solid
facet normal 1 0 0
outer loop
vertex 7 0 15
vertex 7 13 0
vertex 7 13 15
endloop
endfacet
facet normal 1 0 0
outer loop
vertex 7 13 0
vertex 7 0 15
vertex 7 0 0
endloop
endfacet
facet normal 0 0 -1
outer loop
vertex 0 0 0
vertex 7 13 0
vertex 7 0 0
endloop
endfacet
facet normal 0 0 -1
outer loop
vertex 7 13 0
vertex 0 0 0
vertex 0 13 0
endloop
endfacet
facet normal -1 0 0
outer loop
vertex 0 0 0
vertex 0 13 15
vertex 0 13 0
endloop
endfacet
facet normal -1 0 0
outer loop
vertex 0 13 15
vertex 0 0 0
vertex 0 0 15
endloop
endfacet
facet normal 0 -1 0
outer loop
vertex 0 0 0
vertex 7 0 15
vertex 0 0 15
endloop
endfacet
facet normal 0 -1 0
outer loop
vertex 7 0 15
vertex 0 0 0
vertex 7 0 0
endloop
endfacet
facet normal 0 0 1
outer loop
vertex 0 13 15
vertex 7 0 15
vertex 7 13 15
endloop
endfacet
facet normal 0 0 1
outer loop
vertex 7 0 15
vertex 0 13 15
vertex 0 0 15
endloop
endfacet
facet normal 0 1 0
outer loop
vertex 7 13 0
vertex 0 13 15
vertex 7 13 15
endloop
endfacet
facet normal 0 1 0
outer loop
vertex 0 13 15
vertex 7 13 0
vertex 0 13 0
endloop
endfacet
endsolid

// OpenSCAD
translate([3.5, 2.5, 1.5]) color([0.027936242271358158, 0.20812012525081536, 0.33501316214628807]) cube([7, 5, 3], center=true);
translate([3.5, 2.5, 4.5]) color([0.9609071038114427, 0.29634664160852753, 0.8784103092413238]) cube([7, 5, 3], center=true);
translate([3.5, 2.5, 7.5]) color([0.5532045188241876, 0.32698413866792275, 0.5930193960141523]) cube([7, 5, 3], center=true);
translate([3.5, 2.5, 10.5]) color([0.08080901281968078, 0.5332278801564081, 0.30776249733867533]) cube([7, 5, 3], center=true);
translate([3.5, 2.5, 13.5]) color([0.3765889324074634, 0.14692685712634312, 0.1252359956830017]) cube([7, 5, 3], center=true);
translate([3.5, 7.5, 1.5]) color([0.2228174233130471, 0.5083324480268261, 0.23665719296677712]) cube([7, 5, 3], center=true);
translate([3.5, 7.5, 4.5]) color([0.18394442119493715, 0.3724619255943996, 0.6631955135334705]) cube([7, 5, 3], center=true);
translate([3.5, 7.5, 7.5]) color([0.8609746033864751, 0.6012082175951422, 0.3938011681878649]) cube([7, 5, 3], center=true);
translate([3.5, 7.5, 10.5]) color([0.7021695231885549, 0.13202027544551864, 0.29938666187805807]) cube([7, 5, 3], center=true);
translate([3.5, 7.5, 13.5]) color([0.4167493264442593, 0.9263964007964989, 0.5910765187605377]) cube([7, 5, 3], center=true);
translate([3.5, 11.5, 2.5]) color([0.2980281087530109, 0.35456411603507165, 0.24805850121983253]) cube([7, 3, 5], center=true);
translate([2.5, 11.5, 6.0]) color([0.6327789974902275, 0.6370445113549524, 0.5292072971005523]) cube([5, 3, 2], center=true);
translate([2.5, 11.5, 8.0]) color([0.376431751315491, 0.008427608141492793, 0.9619565585865117]) cube([5, 3, 2], center=true);
translate([2.5, 11.5, 10.0]) color([0.901262330417864, 0.44129738363616366, 0.3715965769686672]) cube([5, 3, 2], center=true);
translate([2.5, 11.5, 12.0]) color([0.9523409342086877, 0.09105648808381206, 0.18545820412424963]) cube([5, 3, 2], center=true);
translate([2.5, 11.5, 14.0]) color([0.10861526636012075, 0.11215874223546374, 0.6055458611860893]) cube([5, 3, 2], center=true);
translate([6.0, 11.5, 7.5]) color([0.15387883630139487, 0.7025980908137885, 0.928268212070889]) cube([2, 3, 5], center=true);
translate([6.0, 11.5, 12.5]) color([0.18538068806857422, 0.42170431041506296, 0.1747372019883816]) cube([2, 3, 5], center=true);
